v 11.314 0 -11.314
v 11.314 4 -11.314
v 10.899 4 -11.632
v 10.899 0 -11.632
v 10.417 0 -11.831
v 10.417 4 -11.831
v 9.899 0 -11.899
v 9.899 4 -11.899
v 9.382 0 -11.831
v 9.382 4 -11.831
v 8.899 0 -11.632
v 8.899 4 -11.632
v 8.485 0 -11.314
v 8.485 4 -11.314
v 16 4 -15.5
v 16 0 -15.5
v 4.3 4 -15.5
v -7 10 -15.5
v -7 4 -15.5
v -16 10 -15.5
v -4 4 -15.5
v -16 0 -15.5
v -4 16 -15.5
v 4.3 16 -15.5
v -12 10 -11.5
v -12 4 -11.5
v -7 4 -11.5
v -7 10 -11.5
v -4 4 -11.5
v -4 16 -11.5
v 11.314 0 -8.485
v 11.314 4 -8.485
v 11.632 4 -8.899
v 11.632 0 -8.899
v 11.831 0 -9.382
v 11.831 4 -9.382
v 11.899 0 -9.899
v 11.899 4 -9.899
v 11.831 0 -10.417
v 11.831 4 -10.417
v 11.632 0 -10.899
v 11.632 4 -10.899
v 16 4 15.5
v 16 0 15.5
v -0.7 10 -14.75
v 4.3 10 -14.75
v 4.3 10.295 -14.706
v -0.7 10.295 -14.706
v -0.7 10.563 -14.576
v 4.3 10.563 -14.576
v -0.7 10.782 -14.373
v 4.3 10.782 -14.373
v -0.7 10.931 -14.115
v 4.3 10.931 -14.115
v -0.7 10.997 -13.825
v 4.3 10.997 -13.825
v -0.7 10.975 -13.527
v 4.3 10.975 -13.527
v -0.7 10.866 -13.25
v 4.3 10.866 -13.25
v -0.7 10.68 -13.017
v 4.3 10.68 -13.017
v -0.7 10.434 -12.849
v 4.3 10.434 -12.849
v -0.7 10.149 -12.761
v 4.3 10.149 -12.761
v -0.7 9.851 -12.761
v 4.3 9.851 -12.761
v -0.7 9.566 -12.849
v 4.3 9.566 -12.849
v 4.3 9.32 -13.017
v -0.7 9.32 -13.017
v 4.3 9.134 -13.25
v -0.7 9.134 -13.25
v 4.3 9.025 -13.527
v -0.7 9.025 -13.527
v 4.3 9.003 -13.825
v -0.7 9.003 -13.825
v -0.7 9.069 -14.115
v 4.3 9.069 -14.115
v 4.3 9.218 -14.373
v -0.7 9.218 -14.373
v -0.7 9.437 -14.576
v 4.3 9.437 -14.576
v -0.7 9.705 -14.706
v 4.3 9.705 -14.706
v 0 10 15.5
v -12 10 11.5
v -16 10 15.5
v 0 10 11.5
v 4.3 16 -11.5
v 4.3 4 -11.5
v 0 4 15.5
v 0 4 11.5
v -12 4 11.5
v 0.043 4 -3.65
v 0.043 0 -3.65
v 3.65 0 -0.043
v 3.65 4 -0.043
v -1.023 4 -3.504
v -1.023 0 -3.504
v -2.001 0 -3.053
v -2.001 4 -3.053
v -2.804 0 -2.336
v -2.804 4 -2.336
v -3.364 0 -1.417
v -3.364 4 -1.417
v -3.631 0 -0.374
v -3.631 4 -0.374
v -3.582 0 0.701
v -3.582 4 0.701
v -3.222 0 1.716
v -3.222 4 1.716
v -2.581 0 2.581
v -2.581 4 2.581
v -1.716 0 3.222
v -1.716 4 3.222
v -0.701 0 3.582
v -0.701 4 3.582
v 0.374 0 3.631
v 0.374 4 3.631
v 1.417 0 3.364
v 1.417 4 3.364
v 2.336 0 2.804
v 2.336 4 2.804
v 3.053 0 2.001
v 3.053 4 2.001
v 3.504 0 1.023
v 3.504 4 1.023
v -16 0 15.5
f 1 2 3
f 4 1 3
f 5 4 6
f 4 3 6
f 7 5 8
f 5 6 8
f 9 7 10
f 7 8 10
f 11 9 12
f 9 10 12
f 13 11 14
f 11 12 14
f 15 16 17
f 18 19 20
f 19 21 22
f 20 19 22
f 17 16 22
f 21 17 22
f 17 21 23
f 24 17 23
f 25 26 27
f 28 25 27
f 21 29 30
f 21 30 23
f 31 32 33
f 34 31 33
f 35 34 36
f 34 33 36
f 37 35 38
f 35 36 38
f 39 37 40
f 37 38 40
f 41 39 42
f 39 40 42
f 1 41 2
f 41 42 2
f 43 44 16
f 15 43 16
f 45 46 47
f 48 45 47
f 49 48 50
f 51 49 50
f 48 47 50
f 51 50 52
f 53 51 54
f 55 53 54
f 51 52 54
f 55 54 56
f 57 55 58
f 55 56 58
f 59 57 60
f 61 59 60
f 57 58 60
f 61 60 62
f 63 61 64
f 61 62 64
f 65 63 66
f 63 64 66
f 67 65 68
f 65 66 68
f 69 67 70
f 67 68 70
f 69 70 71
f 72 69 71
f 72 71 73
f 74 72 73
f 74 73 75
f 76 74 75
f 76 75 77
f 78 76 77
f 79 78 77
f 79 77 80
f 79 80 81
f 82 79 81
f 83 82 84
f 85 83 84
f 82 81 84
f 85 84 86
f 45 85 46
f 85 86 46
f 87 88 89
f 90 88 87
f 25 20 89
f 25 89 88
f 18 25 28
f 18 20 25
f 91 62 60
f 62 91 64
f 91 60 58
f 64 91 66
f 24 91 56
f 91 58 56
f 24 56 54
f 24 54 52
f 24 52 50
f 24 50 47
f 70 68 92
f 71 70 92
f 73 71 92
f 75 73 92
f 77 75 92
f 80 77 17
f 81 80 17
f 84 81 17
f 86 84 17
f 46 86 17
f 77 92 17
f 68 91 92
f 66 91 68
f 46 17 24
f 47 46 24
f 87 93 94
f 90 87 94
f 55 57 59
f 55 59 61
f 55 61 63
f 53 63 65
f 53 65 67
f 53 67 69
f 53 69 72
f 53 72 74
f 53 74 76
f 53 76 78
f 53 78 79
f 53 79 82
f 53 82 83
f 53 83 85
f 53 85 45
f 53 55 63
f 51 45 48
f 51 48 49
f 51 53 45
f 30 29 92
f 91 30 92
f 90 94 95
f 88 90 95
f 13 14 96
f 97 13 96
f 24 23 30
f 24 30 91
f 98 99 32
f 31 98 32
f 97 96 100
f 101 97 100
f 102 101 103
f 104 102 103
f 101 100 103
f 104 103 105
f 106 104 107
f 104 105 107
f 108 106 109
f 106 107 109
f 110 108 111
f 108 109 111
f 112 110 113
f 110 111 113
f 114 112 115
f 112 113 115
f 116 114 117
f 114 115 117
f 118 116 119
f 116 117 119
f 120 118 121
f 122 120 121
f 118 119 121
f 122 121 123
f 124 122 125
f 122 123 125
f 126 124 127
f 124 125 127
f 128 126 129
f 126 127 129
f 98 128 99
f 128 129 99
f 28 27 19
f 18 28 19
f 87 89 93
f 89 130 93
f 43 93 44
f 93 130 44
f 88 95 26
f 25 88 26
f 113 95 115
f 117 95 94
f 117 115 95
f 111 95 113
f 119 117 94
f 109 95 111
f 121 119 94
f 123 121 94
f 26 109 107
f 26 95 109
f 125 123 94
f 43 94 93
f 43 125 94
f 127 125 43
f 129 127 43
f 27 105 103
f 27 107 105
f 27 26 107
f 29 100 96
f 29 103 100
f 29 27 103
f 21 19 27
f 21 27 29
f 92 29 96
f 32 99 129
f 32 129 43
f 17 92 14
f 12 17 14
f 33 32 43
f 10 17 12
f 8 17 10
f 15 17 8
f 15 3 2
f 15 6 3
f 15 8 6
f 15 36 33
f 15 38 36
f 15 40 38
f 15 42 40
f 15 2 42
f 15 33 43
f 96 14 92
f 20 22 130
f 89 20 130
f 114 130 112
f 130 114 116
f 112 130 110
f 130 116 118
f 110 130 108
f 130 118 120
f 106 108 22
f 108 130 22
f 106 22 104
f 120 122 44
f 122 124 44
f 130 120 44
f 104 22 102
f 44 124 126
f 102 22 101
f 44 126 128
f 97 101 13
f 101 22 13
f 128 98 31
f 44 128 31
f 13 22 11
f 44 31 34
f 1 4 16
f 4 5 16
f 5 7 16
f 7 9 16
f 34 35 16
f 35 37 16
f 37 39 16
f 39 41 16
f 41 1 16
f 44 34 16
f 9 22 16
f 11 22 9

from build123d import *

# Parameters (mm, degrees)
SKETCH1_W           = 32
SKETCH1_H           = 31
BOSS_EXTRUDE1_DEPTH = 4
BOSS_EXTRUDE2_DEPTH = 6
SKETCH5_W           = 8.3
SKETCH5_H           = 4
BOSS_EXTRUDE3_DEPTH = 12
SKETCH6_R           = 1
CUT_EXTRUDE7_DEPTH  = 5
CUT_EXTRUDE6_DEPTH  = 4


with BuildPart() as part:
    # Sketch1 → Boss-Extrude1 (new body)
    with BuildSketch(Plane(origin=(0, 0, 0), x_dir=(1, 0, 0), z_dir=(0, 1, 0))):
        Rectangle(SKETCH1_W, SKETCH1_H)
    extrude(amount=BOSS_EXTRUDE1_DEPTH)

    # Sketch2 → Boss-Extrude2 (add)
    with BuildSketch(Plane(origin=(0, 4, 0), x_dir=(1, 0, 0), z_dir=(0, 1, 0))):
        Polygon((-16, 15.5), (-16, -15.5), (0, -15.5), (0, -11.5), (-12, -11.5), (-12, 11.5), (-7, 11.5), (-7, 15.5), align=None)
    extrude(amount=BOSS_EXTRUDE2_DEPTH)

    # Sketch5 → Boss-Extrude3 (add)
    with BuildSketch(Plane(origin=(0, 4, 0), x_dir=(1, 0, 0), z_dir=(0, 1, 0))):
        with Locations((0.15, 13.5)):
            Rectangle(SKETCH5_W, SKETCH5_H)
    extrude(amount=BOSS_EXTRUDE3_DEPTH)

    # Sketch6 → Cut-Extrude7 (cut)
    with BuildSketch(Plane(origin=(4.3, 0, 0), x_dir=(0, 0, -1), z_dir=(1, 0, 0))):
        with Locations((13.75, 10)):
            Circle(SKETCH6_R)
    extrude(amount=-CUT_EXTRUDE7_DEPTH, mode=Mode.SUBTRACT)

    # Sketch4 → Cut-Extrude6 (cut)
    with BuildSketch(Plane(origin=(0, 4, 0), x_dir=(0.7071067811864886, 0, -0.7071067811866065), z_dir=(0, 1, 0))):
        with BuildLine():
            Line((14, 2), (2.611512971, 2.55))
            ThreePointArc((2.611512971, 2.55), (3.380423224, 1.376676733), (3.65, 0))
            ThreePointArc((3.65, 0), (3.380423224, -1.376676733), (2.611512971, -2.55))
            Line((2.611512971, -2.55), (14, -2))
            ThreePointArc((14, -2), (15.414213562, -1.414213562), (16, 0))
            ThreePointArc((16, 0), (15.414213562, 1.414213562), (14, 2))
        make_face()
        with BuildLine():
            ThreePointArc((3.65, 0), (3.380423224, 1.376676733), (2.611512971, 2.55))
            ThreePointArc((2.611512971, 2.55), (-3.65, 0), (2.611512971, -2.55))
            ThreePointArc((2.611512971, -2.55), (3.380423224, -1.376676733), (3.65, 0))
        make_face()
    extrude(amount=-CUT_EXTRUDE6_DEPTH, mode=Mode.SUBTRACT)


solid = part.part
